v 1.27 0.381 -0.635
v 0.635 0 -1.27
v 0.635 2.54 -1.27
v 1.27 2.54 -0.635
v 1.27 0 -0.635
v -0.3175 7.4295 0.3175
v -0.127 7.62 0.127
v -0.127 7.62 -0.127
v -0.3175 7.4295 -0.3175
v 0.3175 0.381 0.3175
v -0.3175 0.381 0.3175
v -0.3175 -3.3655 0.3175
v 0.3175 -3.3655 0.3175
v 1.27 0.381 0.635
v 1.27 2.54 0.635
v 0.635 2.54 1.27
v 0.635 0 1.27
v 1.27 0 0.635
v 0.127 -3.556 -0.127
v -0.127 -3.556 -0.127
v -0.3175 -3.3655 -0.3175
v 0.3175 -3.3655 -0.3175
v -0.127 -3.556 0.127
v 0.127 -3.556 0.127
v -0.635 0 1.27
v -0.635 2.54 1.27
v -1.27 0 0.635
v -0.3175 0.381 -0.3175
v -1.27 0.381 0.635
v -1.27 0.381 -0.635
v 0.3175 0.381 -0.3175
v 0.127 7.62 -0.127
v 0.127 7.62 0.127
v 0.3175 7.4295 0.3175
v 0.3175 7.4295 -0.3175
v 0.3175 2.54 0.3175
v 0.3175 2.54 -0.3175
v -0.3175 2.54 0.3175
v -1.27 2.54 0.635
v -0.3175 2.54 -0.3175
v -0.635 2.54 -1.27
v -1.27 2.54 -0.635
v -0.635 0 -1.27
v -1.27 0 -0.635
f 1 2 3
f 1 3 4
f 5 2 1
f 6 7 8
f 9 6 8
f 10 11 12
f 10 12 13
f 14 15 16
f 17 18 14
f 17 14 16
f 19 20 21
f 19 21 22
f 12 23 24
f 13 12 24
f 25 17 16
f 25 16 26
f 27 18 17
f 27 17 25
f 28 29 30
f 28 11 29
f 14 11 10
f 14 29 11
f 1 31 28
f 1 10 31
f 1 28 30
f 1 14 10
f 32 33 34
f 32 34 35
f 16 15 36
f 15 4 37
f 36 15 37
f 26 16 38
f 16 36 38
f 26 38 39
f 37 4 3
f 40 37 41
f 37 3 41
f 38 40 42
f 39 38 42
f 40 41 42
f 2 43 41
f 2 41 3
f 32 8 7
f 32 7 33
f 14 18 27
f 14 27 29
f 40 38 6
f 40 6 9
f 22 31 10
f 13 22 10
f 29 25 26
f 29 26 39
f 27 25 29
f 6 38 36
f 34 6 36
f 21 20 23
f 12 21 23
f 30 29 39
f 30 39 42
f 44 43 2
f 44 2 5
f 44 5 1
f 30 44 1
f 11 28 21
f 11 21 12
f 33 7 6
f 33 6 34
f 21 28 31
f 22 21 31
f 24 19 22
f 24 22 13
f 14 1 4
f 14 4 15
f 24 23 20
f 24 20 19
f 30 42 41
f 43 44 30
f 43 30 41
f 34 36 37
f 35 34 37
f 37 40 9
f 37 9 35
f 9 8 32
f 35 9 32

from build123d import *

# Parameters (mm, degrees)
BOSS_EXTRUDE1_DEPTH = 2.54
SKETCH2_W           = 1.27
SKETCH2_H           = 0.381
CUT_EXTRUDE1_DEPTH  = 2.54
SKETCH3_W           = 0.635
SKETCH3_H           = 0.635
BOSS_EXTRUDE2_DEPTH = 5.08
CHAMFER1_SIZE       = 0.1905
SKETCH4_W           = 0.635
SKETCH4_H           = 0.635
BOSS_EXTRUDE3_DEPTH = 3.937
CHAMFER2_SIZE       = 0.1905


with BuildPart() as part:
    # Sketch1 → Boss-Extrude1 (new body)
    with BuildSketch(Plane(origin=(0, 0, 0), x_dir=(1, 0, 0), z_dir=(0, 1, 0))):
        Polygon((0.635, 1.27), (1.27, 0.635), (1.27, -0.635), (0.635, -1.27), (-0.635, -1.27), (-1.27, -0.635), (-1.27, 0.635), (-0.635, 1.27), align=None)
    extrude(amount=BOSS_EXTRUDE1_DEPTH)

    # Sketch2 → Cut-Extrude1 (cut)
    with BuildSketch(Plane(origin=(1.27, 0, 0), x_dir=(0, 0, -1), z_dir=(1, 0, 0))):
        with Locations((0, 0.1905)):
            Rectangle(SKETCH2_W, SKETCH2_H)
    extrude(amount=-CUT_EXTRUDE1_DEPTH, mode=Mode.SUBTRACT)

    # Sketch3 → Boss-Extrude2 (add)
    with BuildSketch(Plane(origin=(0, 2.54, 0), x_dir=(1, 0, 0), z_dir=(0, 1, 0))):
        Rectangle(SKETCH3_W, SKETCH3_H)
    extrude(amount=BOSS_EXTRUDE2_DEPTH)

    # Chamfer1
    chamfer1_edges = [part.edges().sort_by_distance(p)[0] for p in [
        (0.3175, 7.62, 0),
        (0, 7.62, -0.3175),
        (-0.3175, 7.62, 0),
        (0, 7.62, 0.3175),
    ]]
    chamfer(chamfer1_edges, length=CHAMFER1_SIZE)

    # Sketch4 → Boss-Extrude3 (add)
    with BuildSketch(Plane.XZ.offset(-0.381)):
        Rectangle(SKETCH4_W, SKETCH4_H)
    extrude(amount=BOSS_EXTRUDE3_DEPTH)

    # Chamfer2
    chamfer2_edges = [part.edges().sort_by_distance(p)[0] for p in [
        (0.3175, -3.556, 0),
        (0, -3.556, 0.3175),
        (-0.3175, -3.556, 0),
        (0, -3.556, -0.3175),
    ]]
    chamfer(chamfer2_edges, length=CHAMFER2_SIZE)


solid = part.part
